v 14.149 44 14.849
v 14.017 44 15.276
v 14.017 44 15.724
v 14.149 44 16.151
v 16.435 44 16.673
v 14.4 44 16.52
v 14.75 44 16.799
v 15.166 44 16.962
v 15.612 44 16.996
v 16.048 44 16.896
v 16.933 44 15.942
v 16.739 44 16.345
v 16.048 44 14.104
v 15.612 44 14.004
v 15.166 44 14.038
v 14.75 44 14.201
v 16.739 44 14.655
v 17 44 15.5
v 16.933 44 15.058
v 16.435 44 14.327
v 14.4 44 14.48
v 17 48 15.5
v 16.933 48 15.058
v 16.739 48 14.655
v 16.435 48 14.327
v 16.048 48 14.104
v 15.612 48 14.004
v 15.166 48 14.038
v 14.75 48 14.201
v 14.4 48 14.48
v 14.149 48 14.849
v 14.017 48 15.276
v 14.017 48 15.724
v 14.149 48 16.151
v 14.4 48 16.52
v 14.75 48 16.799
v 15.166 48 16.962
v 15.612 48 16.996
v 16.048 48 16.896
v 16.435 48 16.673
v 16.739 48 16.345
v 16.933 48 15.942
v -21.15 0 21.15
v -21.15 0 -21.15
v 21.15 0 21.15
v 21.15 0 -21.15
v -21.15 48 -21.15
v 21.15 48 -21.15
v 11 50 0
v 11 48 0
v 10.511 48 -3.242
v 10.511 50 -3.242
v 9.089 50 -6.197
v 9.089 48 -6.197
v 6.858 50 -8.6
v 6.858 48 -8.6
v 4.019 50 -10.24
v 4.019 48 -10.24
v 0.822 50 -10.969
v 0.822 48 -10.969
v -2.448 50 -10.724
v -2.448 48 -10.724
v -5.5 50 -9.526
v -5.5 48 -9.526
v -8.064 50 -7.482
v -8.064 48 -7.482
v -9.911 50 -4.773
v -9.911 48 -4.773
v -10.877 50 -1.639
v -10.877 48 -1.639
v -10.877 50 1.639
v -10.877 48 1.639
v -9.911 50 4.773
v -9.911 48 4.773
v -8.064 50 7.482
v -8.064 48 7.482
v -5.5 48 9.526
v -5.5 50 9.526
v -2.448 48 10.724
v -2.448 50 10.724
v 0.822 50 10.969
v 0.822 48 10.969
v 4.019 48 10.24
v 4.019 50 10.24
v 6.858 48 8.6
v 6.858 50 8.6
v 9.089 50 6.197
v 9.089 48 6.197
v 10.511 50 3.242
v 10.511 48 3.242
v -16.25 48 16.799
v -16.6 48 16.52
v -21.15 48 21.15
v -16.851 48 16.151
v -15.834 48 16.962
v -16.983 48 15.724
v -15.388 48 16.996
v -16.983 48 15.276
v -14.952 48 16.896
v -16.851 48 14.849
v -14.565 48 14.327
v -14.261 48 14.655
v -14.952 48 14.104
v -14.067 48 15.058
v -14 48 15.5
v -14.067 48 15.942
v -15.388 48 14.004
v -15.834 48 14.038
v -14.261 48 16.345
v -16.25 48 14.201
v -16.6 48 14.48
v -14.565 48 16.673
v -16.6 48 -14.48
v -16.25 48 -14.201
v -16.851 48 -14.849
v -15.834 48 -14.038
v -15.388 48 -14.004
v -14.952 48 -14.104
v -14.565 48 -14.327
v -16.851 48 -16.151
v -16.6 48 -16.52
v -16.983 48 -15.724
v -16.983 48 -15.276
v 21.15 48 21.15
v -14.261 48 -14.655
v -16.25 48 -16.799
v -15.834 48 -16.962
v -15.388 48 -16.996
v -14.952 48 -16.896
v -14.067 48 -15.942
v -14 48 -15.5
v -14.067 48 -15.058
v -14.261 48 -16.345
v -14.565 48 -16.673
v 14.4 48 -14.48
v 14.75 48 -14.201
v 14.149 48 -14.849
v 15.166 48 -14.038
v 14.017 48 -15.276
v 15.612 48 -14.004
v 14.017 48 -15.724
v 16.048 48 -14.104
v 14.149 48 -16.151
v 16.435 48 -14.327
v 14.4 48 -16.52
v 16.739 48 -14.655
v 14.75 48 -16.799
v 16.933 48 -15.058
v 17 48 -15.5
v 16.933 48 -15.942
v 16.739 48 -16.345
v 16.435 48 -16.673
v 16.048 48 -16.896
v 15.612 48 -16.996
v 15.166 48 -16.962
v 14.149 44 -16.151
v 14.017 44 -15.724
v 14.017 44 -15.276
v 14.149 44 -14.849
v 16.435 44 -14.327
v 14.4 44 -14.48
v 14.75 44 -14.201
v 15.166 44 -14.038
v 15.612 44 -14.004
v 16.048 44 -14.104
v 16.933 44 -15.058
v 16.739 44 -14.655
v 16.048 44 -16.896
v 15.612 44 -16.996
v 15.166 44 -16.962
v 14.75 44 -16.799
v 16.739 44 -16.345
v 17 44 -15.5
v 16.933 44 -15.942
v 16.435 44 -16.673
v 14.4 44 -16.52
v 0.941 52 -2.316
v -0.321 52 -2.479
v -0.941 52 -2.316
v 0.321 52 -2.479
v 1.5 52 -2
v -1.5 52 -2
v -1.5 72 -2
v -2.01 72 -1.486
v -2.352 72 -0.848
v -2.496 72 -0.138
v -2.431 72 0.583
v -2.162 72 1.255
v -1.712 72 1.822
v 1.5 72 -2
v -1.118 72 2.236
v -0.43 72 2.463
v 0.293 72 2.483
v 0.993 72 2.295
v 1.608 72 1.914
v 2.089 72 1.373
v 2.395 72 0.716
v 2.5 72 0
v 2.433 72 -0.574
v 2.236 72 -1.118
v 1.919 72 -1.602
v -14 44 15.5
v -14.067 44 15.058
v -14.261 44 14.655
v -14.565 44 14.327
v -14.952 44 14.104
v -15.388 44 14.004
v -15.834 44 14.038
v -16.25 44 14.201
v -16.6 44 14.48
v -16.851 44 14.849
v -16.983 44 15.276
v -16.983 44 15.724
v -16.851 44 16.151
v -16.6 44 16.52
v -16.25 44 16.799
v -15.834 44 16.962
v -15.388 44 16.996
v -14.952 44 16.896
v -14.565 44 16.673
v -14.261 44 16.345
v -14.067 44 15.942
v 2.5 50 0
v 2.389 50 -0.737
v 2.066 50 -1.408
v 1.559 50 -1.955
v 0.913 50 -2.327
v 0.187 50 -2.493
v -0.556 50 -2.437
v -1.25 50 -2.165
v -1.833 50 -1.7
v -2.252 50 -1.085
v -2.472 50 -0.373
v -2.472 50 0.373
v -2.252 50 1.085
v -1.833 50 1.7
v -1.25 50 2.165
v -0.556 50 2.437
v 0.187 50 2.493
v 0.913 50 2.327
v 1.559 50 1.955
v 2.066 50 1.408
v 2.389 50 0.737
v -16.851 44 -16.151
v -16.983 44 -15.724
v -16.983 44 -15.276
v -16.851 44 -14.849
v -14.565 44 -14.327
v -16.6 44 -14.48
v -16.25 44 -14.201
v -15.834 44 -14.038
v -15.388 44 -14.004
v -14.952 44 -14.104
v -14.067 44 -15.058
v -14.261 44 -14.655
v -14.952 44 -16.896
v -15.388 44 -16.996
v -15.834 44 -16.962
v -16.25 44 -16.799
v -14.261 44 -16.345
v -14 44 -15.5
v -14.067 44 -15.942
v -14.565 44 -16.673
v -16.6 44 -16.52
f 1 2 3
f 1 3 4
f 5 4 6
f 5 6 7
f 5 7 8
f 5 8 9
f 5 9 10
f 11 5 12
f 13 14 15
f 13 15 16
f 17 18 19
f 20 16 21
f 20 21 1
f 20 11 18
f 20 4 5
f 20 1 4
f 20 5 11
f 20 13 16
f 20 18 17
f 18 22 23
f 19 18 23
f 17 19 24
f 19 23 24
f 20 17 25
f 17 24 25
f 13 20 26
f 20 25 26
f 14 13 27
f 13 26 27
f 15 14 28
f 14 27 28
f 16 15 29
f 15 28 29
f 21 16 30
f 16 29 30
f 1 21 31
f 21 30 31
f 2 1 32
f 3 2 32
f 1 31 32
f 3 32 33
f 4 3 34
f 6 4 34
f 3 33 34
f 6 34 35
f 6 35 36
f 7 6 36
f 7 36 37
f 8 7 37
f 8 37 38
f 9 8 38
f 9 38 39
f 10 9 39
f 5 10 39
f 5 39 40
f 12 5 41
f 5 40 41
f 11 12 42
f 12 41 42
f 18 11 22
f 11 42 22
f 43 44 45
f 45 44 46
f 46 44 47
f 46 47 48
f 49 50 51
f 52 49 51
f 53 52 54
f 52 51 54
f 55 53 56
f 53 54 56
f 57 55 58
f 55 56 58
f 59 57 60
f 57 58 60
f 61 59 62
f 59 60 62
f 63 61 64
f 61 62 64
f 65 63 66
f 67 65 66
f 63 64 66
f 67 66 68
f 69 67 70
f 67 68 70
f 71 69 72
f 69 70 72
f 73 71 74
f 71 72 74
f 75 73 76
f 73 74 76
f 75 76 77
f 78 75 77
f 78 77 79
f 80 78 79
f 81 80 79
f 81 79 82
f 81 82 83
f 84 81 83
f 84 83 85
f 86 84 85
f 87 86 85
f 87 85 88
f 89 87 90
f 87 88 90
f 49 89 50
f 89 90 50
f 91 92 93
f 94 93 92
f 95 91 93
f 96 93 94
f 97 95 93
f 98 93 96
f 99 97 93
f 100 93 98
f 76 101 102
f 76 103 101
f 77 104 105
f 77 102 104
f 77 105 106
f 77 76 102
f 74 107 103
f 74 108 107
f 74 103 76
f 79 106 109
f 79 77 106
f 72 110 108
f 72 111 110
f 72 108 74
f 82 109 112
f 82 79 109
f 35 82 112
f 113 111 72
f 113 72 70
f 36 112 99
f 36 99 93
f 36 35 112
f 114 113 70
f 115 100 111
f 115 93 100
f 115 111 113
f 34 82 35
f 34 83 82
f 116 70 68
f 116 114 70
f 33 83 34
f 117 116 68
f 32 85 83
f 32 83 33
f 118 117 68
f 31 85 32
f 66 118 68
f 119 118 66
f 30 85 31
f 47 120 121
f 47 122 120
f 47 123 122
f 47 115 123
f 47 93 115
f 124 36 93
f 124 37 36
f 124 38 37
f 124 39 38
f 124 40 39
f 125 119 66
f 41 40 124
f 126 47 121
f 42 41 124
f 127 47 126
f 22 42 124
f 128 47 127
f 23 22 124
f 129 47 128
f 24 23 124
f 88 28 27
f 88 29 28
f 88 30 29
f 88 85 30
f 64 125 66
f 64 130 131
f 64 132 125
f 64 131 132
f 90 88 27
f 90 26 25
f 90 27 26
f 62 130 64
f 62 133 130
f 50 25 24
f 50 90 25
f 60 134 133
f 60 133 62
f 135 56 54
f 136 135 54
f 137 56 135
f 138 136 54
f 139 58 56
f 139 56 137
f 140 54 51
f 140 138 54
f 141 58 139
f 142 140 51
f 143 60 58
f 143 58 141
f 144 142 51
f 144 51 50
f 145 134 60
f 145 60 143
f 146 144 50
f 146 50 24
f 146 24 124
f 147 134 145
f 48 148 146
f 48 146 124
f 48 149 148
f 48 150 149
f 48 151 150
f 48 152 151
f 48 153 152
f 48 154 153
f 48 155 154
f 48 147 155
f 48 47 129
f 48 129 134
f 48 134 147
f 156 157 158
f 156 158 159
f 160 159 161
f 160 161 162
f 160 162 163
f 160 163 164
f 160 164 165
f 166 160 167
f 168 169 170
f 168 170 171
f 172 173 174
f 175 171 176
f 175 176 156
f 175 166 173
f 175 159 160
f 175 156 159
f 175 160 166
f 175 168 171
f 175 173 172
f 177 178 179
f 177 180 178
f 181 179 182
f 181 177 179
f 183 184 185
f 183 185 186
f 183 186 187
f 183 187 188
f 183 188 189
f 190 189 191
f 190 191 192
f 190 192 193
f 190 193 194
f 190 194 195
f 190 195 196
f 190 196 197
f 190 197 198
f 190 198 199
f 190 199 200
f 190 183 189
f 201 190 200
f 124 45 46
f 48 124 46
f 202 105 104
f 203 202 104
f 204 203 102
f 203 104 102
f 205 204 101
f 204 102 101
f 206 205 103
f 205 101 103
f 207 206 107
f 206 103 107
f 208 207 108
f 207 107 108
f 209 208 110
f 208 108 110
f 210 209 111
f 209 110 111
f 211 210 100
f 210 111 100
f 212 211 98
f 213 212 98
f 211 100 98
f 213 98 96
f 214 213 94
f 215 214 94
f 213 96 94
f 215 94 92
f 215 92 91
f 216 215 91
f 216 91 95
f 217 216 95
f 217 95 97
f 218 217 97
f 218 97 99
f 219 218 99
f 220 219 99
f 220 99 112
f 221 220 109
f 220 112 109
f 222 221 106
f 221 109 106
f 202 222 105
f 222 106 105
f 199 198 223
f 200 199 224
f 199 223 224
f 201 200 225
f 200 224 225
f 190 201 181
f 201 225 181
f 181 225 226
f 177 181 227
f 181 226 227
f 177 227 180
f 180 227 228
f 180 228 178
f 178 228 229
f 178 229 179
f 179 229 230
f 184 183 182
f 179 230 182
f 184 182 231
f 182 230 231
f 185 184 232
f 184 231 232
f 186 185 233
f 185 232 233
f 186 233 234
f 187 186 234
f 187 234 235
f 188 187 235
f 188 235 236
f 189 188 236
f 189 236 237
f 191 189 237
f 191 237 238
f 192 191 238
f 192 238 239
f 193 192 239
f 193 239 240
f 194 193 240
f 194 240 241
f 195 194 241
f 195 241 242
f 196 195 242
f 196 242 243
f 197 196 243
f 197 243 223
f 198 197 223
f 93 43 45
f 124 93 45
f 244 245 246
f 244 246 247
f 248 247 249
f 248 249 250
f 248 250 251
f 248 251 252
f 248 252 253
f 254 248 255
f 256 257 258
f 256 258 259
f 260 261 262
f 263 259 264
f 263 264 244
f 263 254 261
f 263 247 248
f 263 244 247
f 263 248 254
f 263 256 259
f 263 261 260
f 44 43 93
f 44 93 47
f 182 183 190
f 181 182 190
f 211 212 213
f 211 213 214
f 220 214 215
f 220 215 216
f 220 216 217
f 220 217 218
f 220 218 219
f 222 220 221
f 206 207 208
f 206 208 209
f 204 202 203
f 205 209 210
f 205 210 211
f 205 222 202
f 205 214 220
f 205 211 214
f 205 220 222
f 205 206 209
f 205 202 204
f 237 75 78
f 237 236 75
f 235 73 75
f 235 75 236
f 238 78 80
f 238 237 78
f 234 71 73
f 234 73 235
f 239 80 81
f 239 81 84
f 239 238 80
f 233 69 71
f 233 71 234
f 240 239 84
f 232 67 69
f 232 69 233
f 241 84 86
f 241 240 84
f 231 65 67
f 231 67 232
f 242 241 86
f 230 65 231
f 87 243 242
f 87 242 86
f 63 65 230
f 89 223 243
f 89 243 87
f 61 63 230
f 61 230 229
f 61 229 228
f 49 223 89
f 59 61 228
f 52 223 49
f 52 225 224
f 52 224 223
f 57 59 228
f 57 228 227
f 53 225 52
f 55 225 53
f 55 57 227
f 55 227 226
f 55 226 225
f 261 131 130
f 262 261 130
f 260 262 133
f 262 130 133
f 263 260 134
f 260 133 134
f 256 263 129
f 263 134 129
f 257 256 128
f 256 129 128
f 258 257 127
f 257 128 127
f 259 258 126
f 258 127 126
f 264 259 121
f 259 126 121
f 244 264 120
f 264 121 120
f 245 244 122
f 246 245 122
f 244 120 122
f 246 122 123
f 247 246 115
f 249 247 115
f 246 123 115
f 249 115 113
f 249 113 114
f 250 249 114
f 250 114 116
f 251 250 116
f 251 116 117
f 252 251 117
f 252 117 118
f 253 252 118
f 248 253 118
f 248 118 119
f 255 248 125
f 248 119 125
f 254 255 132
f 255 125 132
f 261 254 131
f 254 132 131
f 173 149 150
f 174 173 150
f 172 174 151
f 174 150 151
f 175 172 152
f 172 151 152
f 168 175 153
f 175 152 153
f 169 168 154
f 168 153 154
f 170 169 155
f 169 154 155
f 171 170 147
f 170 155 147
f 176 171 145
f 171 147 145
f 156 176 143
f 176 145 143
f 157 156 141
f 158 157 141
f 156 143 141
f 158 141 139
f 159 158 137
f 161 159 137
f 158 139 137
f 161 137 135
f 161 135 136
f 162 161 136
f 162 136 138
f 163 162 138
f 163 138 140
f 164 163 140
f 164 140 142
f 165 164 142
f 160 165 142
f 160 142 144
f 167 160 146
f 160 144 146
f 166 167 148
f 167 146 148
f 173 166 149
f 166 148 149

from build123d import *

# Parameters (mm, degrees)
SKETCH1_W           = 42.3
SKETCH1_H           = 42.3
BOSS_EXTRUDE1_DEPTH = 48
SKETCH2_R           = 11
BOSS_EXTRUDE2_DEPTH = 2
SKETCH3_R           = 2.5
BOSS_EXTRUDE3_DEPTH = 24
SKETCH4_R           = 1.5
CUT_EXTRUDE1_DEPTH  = 4
CUT_EXTRUDE2_DEPTH  = 20


with BuildPart() as part:
    # Sketch1 → Boss-Extrude1 (new body)
    with BuildSketch(Plane(origin=(0, 0, 0), x_dir=(1, 0, 0), z_dir=(0, 1, 0))):
        Rectangle(SKETCH1_W, SKETCH1_H)
    extrude(amount=BOSS_EXTRUDE1_DEPTH)

    # Sketch2 → Boss-Extrude2 (add)
    with BuildSketch(Plane(origin=(0, 48, 0), x_dir=(1, 0, 0), z_dir=(0, 1, 0))):
        Circle(SKETCH2_R)
    extrude(amount=BOSS_EXTRUDE2_DEPTH)

    # Sketch3 → Boss-Extrude3 (add)
    with BuildSketch(Plane(origin=(0, 48, 0), x_dir=(1, 0, 0), z_dir=(0, 1, 0))):
        Circle(SKETCH3_R)
    extrude(amount=BOSS_EXTRUDE3_DEPTH)

    # Sketch4 → Cut-Extrude1 (cut)
    with BuildSketch(Plane(origin=(0, 48, 0), x_dir=(1, 0, 0), z_dir=(0, 1, 0))):
        with Locations((15.5, 15.5)):
            Circle(SKETCH4_R)
        with Locations((15.5, -15.5)):
            Circle(SKETCH4_R)
        with Locations((-15.5, 15.5)):
            Circle(SKETCH4_R)
        with Locations((-15.5, -15.5)):
            Circle(SKETCH4_R)
    extrude(amount=-CUT_EXTRUDE1_DEPTH, mode=Mode.SUBTRACT)

    # Sketch5 → Cut-Extrude2 (cut)
    with BuildSketch(Plane(origin=(0, 72, 0), x_dir=(1, 0, 0), z_dir=(0, 1, 0))):
        Polygon((-76.274840795, 2), (-1.5, 2), (1.5, 2), (76.274840795, 2), (76.274840795, 151.54968159), (-76.274840795, 151.54968159), align=None)
    extrude(amount=-CUT_EXTRUDE2_DEPTH, mode=Mode.SUBTRACT)


solid = part.part
